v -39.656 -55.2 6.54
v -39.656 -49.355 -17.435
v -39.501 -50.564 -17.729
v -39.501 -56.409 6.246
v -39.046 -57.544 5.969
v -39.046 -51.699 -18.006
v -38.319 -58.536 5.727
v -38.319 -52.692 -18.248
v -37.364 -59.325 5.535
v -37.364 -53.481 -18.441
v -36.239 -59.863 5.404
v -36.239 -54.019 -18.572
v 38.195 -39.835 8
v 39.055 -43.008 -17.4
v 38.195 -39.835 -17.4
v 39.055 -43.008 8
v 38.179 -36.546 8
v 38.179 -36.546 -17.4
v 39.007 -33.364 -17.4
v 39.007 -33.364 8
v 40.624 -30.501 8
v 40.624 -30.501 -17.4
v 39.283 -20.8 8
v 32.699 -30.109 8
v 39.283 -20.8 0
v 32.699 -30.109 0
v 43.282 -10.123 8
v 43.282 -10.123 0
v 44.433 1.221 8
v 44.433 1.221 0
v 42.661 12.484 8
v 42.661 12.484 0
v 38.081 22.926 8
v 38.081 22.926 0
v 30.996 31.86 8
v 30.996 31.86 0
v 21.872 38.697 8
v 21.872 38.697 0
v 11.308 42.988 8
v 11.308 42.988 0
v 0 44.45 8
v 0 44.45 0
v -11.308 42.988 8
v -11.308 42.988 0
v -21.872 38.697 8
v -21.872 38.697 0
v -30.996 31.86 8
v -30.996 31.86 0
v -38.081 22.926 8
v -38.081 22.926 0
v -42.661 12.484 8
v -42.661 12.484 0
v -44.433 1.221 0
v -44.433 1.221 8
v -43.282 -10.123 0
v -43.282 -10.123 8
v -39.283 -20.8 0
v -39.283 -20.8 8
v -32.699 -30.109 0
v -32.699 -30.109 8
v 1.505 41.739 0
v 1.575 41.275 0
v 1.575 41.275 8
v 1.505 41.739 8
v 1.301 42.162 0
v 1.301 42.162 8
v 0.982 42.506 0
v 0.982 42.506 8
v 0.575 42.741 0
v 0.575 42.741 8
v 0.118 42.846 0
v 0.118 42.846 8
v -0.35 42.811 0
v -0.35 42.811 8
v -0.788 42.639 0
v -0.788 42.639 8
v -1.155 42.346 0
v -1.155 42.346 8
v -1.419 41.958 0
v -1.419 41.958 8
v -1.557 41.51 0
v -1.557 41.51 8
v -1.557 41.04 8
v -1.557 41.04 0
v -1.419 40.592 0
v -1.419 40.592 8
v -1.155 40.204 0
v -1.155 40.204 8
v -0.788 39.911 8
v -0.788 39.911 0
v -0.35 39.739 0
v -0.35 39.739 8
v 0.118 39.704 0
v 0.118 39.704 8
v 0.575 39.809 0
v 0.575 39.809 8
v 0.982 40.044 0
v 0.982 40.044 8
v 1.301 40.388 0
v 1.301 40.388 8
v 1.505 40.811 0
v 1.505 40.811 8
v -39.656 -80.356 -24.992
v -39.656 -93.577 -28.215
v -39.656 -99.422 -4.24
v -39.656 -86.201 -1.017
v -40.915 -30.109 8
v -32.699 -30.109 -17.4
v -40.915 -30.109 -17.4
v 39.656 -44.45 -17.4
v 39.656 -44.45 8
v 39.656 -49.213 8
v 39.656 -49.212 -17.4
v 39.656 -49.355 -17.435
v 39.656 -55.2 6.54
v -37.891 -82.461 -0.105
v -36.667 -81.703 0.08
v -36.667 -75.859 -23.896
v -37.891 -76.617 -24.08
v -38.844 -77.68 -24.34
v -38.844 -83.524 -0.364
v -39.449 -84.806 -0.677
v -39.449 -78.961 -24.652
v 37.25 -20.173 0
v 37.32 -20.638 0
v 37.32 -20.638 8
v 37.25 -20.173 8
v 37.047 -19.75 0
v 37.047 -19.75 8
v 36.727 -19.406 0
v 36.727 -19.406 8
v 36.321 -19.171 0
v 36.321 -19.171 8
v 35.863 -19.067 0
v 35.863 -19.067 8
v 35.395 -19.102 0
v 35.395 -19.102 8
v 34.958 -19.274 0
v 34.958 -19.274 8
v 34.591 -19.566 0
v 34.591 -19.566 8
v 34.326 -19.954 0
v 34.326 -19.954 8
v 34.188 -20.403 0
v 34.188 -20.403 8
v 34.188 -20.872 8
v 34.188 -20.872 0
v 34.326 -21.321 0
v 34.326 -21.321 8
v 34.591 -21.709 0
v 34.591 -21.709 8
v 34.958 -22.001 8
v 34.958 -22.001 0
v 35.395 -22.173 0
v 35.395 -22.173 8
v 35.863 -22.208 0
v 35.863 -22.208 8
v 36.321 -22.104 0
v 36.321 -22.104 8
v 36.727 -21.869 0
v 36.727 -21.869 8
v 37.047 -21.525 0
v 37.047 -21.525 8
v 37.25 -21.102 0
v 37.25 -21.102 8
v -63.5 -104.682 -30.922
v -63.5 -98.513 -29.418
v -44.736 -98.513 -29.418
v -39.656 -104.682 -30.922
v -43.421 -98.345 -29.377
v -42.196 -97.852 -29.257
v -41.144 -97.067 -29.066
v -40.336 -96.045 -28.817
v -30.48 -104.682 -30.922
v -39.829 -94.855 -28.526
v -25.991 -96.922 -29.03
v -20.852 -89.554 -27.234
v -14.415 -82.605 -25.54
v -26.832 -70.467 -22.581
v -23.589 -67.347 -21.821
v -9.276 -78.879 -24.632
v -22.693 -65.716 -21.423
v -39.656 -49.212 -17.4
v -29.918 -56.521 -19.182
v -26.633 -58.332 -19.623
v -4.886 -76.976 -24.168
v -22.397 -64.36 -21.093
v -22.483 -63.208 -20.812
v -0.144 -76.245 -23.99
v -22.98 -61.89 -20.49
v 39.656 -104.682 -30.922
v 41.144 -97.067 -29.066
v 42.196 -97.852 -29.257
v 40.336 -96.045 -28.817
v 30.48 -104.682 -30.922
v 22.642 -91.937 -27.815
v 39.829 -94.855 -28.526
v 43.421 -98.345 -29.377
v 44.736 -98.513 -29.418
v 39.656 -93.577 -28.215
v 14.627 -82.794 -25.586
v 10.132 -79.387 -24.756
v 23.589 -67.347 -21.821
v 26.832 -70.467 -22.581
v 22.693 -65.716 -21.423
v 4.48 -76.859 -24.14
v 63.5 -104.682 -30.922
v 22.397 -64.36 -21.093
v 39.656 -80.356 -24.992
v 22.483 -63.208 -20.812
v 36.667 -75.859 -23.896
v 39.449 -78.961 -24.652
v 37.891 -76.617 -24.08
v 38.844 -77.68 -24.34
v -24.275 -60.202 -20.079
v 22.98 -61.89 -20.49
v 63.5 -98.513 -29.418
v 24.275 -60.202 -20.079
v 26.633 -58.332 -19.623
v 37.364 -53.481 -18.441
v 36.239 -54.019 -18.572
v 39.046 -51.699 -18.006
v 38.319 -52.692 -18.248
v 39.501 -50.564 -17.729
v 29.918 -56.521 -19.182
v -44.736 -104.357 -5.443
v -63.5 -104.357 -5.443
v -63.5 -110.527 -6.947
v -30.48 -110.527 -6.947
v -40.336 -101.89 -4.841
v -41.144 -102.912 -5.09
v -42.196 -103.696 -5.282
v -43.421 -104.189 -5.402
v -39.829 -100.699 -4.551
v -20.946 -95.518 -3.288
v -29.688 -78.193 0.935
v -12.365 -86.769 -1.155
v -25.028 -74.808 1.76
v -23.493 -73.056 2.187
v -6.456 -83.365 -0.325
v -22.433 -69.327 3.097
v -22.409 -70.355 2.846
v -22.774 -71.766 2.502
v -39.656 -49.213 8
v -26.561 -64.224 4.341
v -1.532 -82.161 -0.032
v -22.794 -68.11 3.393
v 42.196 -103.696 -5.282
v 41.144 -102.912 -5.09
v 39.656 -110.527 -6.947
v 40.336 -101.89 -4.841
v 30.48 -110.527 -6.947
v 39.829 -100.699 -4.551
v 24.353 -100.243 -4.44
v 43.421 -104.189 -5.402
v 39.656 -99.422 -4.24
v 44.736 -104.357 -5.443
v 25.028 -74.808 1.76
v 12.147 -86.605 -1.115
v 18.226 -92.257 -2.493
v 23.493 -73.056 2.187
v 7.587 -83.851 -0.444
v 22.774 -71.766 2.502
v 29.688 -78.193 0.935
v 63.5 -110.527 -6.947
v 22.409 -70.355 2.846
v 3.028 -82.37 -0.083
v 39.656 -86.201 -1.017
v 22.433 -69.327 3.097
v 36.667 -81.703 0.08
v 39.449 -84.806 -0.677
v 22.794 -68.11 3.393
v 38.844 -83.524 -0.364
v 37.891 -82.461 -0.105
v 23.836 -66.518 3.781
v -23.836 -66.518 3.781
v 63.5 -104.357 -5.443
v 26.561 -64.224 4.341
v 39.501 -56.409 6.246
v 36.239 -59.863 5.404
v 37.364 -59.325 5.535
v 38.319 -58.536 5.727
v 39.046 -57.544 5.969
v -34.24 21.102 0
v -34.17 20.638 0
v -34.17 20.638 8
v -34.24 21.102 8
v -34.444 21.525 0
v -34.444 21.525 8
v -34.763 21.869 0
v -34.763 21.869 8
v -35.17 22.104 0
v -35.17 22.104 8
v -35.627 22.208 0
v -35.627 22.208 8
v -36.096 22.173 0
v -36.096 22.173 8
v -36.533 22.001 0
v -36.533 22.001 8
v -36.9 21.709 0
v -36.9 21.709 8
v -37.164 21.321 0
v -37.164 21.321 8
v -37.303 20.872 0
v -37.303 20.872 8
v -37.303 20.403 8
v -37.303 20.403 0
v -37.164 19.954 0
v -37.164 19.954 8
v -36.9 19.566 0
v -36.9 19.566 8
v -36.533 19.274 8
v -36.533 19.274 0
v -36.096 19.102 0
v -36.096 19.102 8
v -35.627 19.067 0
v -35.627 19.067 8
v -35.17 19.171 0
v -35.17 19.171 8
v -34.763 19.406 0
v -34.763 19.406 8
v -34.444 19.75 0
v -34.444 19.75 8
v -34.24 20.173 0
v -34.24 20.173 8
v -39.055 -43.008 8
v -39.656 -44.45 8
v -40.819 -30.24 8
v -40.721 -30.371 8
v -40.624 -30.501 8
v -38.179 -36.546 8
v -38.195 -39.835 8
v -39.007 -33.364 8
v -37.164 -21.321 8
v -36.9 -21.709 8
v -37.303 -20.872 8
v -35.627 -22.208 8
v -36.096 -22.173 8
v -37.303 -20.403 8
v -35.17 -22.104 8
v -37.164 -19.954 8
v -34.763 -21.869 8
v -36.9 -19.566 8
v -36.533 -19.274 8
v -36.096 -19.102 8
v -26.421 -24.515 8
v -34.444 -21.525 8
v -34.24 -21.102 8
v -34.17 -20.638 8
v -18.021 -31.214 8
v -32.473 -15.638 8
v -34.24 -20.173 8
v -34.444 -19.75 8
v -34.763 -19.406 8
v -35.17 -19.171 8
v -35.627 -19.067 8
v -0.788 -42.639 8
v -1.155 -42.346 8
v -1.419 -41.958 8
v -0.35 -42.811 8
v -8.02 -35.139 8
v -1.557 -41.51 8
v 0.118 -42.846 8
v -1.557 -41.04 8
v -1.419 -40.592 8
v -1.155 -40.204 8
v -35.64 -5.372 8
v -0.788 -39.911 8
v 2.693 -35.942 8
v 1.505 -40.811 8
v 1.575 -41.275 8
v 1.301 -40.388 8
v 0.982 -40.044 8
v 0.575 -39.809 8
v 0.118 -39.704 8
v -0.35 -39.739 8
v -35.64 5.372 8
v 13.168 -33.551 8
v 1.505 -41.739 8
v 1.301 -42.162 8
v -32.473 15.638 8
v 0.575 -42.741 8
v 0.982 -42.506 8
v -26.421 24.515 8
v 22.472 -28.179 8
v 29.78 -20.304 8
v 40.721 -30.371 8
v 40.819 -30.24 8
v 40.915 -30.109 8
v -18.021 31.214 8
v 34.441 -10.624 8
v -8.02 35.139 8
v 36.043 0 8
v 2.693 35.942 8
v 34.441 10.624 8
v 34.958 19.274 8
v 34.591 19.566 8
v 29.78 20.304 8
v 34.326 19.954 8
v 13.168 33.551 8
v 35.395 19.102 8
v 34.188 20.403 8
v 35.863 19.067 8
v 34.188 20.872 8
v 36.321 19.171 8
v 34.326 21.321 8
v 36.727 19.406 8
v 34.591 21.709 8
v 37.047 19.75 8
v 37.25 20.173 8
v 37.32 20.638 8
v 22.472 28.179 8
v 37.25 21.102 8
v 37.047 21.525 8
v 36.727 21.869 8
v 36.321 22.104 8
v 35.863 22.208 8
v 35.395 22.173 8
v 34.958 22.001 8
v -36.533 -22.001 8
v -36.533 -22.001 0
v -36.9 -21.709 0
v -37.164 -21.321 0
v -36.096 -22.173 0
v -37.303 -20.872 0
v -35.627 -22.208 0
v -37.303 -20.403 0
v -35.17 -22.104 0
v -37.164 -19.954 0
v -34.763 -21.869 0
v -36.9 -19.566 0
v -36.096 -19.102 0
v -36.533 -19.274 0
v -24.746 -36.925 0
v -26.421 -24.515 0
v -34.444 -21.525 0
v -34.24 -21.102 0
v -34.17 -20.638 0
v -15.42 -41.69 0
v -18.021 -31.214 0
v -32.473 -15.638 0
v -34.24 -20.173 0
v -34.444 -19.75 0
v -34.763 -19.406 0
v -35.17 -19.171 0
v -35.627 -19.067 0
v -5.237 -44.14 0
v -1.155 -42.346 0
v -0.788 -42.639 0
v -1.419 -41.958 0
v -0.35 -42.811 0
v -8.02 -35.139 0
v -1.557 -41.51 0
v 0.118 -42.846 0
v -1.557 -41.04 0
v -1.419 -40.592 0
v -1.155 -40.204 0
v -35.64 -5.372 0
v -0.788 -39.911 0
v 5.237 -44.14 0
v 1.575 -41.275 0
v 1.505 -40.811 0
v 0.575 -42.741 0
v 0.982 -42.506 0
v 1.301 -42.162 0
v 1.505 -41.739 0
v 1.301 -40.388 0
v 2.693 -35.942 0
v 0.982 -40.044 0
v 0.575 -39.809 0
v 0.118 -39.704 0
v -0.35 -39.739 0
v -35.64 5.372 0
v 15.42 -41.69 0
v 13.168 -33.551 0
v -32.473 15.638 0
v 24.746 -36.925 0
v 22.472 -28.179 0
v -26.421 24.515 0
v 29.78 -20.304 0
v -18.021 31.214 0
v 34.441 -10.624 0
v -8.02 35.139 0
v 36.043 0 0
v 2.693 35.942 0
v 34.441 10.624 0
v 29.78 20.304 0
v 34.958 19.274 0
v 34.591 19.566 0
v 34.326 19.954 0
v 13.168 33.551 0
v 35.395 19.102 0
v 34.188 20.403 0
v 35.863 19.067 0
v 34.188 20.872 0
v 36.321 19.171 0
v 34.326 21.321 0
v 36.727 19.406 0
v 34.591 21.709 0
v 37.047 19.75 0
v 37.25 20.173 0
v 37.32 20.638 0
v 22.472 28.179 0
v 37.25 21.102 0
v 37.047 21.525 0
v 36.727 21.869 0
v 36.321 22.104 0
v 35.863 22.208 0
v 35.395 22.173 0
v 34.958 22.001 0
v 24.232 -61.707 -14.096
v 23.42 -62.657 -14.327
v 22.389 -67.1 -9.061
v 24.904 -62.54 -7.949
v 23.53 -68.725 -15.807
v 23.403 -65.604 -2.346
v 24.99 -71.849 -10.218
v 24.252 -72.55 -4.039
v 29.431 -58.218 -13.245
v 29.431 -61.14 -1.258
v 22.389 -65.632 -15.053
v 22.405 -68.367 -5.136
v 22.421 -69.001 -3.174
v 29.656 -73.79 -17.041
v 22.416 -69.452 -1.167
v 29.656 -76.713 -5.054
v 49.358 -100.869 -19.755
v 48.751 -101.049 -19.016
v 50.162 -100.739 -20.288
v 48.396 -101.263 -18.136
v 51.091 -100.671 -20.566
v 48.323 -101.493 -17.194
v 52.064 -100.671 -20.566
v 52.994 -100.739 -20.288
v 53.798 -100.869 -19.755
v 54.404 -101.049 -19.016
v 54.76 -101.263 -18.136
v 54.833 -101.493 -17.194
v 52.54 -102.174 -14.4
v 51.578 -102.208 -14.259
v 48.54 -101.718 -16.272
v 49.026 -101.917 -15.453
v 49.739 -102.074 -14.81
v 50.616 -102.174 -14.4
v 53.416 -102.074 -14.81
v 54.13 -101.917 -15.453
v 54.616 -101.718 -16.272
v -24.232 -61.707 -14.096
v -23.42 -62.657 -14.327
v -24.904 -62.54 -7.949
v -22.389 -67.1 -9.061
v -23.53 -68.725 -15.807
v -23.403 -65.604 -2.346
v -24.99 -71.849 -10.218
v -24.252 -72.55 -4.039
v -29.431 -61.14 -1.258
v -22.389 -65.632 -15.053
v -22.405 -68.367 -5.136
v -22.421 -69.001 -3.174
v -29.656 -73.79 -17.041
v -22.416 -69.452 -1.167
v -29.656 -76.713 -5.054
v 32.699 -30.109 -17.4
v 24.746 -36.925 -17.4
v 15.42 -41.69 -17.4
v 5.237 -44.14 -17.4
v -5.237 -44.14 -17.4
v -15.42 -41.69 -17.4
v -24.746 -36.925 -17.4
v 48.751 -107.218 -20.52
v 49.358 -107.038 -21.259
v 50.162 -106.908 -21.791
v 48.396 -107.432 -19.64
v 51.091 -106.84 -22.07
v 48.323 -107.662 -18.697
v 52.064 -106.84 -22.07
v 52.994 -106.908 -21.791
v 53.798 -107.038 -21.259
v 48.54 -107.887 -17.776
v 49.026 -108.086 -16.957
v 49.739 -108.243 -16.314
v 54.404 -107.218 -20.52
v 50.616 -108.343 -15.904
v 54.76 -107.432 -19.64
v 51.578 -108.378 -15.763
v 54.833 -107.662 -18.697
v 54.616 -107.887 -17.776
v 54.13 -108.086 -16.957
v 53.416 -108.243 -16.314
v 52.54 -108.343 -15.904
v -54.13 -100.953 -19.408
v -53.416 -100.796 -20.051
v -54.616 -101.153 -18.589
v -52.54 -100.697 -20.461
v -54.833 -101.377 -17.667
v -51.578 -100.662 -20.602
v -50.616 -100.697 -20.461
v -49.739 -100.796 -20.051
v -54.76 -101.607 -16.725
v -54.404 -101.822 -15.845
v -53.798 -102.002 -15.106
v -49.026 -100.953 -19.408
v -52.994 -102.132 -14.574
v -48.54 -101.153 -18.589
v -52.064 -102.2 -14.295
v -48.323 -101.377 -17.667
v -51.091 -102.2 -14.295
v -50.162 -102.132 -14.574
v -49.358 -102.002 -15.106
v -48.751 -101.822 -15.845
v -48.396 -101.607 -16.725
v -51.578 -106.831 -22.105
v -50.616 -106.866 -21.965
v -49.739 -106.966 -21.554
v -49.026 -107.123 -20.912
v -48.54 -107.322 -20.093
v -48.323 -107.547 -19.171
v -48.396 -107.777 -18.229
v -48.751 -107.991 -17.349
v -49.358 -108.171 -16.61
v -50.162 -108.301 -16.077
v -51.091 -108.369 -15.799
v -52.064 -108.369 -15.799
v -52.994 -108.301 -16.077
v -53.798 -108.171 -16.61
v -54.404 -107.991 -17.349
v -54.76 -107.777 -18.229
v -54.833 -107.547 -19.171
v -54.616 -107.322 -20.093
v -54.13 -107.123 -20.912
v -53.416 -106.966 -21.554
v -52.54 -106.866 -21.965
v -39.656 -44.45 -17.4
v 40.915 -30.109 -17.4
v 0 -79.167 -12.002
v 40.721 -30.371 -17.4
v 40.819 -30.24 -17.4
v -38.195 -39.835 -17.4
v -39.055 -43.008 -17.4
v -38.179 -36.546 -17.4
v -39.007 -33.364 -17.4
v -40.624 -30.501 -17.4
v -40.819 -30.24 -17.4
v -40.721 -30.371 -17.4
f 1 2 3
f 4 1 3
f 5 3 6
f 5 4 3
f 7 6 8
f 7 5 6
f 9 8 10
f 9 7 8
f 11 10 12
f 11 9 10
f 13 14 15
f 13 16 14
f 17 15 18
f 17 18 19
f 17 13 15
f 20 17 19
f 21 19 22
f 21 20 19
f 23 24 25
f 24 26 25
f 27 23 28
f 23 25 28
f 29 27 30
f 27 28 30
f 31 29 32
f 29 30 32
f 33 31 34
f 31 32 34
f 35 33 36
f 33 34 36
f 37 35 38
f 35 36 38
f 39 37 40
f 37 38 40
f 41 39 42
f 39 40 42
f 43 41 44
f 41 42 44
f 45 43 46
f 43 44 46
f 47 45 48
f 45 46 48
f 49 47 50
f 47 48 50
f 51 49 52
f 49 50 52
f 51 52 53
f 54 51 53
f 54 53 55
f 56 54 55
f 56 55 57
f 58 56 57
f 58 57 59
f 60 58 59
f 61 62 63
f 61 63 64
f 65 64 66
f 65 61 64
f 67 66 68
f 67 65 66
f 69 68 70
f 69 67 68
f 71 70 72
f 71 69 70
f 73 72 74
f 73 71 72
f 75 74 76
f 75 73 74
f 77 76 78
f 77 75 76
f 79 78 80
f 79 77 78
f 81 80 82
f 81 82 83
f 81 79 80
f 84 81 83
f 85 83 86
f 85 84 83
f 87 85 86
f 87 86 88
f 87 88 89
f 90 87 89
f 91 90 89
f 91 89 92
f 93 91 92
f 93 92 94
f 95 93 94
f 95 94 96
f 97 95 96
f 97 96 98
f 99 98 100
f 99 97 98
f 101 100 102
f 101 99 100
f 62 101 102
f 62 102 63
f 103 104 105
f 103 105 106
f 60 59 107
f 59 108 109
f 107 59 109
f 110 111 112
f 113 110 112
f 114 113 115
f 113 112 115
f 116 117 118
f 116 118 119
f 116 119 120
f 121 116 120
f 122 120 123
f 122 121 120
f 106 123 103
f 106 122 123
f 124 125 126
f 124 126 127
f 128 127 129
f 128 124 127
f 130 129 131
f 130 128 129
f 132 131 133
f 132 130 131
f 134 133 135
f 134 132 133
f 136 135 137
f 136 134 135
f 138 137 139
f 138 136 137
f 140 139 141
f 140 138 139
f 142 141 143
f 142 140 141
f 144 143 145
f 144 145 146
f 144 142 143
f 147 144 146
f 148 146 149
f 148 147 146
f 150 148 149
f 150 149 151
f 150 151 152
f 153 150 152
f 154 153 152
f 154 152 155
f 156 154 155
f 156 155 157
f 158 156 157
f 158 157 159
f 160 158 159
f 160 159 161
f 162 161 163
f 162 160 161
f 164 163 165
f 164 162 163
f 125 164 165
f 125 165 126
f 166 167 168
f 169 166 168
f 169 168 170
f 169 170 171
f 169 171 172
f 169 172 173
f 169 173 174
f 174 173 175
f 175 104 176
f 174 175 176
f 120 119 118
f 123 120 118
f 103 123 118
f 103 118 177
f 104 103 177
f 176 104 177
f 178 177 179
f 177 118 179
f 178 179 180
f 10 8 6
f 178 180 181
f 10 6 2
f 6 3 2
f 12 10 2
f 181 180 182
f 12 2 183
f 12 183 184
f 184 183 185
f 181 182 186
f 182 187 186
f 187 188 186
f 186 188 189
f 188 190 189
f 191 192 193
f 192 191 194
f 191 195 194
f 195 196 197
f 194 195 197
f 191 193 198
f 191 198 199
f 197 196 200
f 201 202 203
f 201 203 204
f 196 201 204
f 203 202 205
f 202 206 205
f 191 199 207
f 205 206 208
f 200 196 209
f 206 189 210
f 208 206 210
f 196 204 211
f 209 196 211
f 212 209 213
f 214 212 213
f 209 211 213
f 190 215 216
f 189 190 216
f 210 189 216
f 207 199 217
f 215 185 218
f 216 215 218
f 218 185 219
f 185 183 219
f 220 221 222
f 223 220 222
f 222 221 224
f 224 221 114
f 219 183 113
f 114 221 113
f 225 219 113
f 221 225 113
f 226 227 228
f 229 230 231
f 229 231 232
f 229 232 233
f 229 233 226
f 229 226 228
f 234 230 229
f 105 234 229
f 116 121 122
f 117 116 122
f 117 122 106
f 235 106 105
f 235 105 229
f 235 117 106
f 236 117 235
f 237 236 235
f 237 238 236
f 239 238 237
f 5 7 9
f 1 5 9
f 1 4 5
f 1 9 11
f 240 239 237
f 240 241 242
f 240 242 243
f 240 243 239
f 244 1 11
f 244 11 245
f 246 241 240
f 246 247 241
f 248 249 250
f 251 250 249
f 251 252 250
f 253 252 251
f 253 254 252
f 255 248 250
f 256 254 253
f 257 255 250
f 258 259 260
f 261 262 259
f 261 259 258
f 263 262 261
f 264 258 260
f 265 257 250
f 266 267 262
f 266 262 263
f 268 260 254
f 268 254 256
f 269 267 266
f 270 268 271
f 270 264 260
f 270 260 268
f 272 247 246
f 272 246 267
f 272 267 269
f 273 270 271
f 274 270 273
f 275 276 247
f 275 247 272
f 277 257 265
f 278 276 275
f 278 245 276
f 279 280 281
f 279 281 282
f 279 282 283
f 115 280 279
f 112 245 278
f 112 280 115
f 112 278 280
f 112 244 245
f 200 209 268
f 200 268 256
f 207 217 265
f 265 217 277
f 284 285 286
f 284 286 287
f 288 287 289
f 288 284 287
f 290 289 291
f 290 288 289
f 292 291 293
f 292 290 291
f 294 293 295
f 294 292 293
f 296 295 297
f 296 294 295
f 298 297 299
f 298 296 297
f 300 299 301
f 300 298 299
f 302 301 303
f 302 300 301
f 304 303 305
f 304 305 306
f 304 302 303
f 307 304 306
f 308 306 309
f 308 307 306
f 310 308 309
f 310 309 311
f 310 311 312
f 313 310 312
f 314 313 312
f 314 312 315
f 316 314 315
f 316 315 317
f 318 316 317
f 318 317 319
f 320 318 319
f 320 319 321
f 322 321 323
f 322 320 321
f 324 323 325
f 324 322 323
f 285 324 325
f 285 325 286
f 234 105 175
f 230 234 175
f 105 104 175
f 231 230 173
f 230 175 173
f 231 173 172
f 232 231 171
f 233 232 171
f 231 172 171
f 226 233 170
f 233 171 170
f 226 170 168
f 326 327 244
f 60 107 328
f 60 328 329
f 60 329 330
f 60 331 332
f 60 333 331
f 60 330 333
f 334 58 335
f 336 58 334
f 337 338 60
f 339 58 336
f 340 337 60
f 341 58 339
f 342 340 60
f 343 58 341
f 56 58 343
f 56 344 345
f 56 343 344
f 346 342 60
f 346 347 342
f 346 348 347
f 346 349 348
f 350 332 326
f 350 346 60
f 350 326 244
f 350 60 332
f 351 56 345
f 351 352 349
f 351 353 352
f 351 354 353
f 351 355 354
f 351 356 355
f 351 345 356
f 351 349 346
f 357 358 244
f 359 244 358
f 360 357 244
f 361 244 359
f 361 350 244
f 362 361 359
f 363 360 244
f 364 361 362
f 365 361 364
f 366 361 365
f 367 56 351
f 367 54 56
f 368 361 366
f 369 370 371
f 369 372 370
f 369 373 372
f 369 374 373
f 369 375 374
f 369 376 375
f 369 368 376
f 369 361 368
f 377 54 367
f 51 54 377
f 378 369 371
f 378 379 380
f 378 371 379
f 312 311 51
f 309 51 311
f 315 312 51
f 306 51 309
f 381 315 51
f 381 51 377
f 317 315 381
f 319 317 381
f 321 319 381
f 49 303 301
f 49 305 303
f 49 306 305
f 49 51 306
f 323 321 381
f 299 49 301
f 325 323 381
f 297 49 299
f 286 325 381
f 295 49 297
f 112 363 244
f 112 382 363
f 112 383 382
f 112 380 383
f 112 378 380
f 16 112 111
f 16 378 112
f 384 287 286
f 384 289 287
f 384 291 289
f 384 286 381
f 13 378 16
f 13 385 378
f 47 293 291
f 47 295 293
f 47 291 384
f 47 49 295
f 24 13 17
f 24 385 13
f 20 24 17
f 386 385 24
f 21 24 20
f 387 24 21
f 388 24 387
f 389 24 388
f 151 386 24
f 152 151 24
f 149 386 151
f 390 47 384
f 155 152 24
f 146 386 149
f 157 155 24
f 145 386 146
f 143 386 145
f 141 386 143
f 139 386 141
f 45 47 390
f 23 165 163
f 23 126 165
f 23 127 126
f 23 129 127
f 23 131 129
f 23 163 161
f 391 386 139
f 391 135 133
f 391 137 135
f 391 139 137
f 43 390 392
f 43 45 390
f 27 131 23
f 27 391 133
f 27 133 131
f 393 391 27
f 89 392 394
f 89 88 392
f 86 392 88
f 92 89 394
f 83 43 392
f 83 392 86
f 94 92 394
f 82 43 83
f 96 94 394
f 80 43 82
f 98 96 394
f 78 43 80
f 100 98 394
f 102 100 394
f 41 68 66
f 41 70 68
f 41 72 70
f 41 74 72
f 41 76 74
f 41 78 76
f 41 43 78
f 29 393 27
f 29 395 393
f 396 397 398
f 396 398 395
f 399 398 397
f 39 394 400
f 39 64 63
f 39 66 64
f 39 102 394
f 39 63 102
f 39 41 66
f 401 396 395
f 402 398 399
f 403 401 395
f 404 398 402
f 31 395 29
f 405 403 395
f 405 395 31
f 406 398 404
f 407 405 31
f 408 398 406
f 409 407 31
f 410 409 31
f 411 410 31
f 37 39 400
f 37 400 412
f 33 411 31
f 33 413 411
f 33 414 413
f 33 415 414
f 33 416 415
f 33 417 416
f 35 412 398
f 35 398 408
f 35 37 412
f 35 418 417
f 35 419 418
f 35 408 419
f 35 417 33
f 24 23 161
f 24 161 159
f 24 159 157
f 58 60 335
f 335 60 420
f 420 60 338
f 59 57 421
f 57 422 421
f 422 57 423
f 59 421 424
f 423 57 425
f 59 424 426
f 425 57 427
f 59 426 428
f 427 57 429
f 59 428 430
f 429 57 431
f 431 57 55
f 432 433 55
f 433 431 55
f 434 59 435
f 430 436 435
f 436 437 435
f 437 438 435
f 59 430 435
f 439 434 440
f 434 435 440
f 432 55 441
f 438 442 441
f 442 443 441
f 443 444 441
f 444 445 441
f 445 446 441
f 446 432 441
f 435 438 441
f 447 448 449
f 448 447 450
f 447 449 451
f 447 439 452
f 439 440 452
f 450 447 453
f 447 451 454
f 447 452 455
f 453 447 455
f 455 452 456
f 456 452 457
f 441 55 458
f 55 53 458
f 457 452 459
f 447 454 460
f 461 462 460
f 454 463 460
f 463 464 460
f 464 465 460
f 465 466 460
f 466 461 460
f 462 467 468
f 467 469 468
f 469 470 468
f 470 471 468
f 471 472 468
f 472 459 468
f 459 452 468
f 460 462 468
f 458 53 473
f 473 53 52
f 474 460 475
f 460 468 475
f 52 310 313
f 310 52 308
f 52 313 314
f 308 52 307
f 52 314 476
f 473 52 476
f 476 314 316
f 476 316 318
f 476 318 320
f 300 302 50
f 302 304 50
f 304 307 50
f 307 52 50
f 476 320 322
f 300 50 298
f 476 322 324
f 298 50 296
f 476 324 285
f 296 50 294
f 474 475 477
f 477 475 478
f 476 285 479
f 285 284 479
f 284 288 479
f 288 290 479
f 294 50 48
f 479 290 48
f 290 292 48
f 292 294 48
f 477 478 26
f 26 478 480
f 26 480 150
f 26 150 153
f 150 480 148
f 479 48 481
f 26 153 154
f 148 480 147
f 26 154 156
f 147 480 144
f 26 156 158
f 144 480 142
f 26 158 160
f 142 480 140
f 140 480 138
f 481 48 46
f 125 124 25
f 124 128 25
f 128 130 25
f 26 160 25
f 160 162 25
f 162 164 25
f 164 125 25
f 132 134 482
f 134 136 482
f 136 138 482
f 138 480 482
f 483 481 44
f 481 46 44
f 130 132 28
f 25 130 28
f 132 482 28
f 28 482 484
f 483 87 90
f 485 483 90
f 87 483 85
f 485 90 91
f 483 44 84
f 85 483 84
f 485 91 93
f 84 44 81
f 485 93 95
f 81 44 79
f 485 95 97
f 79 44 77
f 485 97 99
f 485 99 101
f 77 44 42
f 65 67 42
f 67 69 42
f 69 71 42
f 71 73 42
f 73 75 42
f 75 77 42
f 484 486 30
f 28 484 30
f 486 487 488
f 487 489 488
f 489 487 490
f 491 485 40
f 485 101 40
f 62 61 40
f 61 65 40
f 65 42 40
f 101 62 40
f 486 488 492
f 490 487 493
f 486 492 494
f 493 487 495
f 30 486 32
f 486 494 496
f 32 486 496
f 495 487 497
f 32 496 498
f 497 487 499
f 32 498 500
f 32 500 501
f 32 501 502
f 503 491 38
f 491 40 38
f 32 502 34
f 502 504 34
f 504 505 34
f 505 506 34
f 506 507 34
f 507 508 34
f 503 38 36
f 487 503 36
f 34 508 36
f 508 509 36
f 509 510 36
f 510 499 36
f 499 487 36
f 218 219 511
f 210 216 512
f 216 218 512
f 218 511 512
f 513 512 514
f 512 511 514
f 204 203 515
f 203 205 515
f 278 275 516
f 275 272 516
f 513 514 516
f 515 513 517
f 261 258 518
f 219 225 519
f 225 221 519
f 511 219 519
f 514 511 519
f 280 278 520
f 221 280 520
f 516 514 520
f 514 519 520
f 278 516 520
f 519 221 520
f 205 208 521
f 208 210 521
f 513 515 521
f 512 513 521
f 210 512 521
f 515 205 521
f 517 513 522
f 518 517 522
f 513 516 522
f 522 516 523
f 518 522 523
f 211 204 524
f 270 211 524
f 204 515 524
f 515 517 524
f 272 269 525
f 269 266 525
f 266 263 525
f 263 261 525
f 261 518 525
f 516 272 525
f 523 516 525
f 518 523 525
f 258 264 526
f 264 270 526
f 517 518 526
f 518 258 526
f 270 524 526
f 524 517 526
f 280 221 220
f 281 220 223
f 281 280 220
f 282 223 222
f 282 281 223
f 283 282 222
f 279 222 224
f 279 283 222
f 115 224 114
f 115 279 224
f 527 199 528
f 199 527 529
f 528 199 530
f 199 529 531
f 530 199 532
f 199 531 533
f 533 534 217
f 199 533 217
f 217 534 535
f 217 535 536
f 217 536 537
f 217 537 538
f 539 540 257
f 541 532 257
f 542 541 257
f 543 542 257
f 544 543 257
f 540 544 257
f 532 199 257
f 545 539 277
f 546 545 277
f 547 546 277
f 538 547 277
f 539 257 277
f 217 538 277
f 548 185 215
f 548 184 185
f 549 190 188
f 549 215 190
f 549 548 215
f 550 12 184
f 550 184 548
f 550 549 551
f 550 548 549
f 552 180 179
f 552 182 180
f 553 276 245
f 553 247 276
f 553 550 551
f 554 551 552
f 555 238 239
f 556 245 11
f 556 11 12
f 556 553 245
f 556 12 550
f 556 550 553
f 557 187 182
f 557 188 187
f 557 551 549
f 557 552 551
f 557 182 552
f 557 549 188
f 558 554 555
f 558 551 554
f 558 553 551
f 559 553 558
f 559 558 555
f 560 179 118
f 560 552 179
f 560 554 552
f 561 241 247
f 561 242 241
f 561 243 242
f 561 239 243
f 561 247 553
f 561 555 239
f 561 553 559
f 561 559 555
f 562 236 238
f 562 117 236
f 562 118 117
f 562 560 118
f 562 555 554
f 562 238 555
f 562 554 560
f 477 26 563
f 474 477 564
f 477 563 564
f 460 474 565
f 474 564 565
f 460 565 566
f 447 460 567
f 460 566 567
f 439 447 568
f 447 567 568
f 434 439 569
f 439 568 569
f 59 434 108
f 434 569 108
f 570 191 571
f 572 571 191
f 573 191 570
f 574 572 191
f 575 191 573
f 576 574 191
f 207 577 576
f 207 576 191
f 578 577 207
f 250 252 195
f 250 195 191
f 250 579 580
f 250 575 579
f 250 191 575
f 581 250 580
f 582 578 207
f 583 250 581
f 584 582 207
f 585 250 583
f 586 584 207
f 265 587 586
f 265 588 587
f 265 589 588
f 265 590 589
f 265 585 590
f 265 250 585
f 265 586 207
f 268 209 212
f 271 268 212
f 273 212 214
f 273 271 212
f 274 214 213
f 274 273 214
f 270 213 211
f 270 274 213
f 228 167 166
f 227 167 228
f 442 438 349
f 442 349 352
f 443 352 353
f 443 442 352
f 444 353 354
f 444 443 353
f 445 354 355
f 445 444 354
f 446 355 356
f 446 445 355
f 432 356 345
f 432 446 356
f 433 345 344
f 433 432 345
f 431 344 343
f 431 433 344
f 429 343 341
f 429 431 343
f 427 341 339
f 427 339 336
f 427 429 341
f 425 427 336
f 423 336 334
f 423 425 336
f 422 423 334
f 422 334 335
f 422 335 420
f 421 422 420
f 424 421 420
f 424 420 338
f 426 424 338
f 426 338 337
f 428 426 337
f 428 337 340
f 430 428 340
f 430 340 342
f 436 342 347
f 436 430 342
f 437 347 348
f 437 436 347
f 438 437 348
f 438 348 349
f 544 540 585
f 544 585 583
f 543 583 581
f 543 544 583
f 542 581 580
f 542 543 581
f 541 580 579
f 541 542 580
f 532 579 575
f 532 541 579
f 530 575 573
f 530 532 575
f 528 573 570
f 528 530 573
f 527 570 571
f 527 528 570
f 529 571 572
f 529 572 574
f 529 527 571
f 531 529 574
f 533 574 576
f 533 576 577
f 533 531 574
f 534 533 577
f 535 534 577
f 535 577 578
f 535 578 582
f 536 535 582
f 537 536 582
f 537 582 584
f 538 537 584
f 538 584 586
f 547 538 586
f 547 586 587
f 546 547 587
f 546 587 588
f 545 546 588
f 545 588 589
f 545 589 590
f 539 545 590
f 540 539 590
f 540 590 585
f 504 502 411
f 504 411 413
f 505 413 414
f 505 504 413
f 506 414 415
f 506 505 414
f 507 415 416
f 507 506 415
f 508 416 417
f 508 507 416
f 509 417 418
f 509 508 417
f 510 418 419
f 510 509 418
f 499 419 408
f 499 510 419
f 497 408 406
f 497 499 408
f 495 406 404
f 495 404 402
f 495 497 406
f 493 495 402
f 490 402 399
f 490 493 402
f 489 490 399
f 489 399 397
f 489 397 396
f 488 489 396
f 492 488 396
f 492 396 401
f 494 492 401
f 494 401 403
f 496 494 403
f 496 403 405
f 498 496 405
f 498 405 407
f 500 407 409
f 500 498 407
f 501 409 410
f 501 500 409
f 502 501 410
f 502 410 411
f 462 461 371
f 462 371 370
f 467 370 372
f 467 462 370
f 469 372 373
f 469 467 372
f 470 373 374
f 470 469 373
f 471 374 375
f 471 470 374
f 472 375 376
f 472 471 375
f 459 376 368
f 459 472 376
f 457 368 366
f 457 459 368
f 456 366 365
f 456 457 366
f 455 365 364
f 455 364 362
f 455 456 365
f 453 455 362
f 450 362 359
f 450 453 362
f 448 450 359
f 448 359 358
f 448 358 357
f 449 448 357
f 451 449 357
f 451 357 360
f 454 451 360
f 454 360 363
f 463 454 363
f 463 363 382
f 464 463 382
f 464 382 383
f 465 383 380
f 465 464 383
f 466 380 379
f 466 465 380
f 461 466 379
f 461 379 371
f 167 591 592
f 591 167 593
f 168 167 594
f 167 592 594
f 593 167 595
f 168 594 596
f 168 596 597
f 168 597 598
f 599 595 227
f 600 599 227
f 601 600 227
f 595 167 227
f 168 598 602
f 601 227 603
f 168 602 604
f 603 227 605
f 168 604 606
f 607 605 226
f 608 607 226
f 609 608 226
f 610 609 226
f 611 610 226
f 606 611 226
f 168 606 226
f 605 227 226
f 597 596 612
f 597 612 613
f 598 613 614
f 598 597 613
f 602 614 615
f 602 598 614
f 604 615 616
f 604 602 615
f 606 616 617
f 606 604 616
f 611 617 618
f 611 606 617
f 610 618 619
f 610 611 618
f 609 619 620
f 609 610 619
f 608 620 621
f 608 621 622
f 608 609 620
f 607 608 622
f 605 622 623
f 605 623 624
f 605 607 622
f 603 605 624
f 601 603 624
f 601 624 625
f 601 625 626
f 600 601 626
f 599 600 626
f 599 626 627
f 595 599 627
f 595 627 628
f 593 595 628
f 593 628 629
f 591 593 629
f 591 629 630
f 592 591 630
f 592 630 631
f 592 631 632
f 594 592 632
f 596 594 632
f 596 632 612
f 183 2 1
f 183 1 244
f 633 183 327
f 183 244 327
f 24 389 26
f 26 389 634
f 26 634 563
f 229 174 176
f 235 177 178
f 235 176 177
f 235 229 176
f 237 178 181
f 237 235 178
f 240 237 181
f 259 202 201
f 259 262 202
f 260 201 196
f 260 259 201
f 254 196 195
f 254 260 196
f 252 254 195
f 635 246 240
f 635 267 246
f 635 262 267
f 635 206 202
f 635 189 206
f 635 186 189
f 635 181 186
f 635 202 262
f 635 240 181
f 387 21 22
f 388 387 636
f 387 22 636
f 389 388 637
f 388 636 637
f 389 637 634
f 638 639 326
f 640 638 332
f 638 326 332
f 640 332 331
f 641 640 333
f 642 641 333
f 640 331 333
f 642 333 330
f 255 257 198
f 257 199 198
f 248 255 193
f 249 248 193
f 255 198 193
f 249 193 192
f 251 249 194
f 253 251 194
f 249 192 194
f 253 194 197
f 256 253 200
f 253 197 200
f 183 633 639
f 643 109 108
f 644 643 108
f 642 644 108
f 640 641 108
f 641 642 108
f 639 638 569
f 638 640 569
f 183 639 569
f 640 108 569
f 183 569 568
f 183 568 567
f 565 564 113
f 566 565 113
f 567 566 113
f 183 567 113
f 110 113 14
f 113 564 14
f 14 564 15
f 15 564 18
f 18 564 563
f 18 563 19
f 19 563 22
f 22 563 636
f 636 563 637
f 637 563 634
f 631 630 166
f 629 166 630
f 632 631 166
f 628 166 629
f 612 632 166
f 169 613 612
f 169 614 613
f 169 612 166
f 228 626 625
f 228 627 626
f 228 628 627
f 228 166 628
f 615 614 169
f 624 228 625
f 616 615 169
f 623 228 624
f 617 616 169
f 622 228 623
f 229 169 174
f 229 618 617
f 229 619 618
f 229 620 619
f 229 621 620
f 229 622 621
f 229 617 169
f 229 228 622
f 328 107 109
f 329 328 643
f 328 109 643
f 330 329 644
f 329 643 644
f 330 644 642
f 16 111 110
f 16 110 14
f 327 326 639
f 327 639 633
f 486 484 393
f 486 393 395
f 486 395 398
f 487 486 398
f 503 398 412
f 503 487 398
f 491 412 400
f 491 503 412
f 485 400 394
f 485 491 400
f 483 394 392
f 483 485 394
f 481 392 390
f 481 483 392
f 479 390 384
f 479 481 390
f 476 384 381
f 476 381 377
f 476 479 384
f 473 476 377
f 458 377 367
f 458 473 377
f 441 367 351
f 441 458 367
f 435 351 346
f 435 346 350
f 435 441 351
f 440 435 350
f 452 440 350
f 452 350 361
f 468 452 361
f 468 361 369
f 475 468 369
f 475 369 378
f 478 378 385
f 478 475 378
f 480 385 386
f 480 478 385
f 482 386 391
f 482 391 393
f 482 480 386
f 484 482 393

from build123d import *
from build123d.topology import SkipClean

# Parameters (mm, degrees)
SKETCH1_R                       = 44.45
SKETCH1_R_2                     = 36.0426
SKETCH1_R_3                     = 1.575
BOSS_EXTRUDE1_DEPTH             = 8
BOSS_EXTRUDE2_START             = -25.4
BOSS_EXTRUDE2_DEPTH             = 25.4
SKETCH5_W                       = 127
SKETCH5_H                       = 24.677347648
BOSS_EXTRUDE3_DEPTH             = 22.86
BOSS_EXTRUDE3_DIRECTION_2_REACH = 117.98
CUT_EXTRUDE1_DEPTH              = 103.517532245
CUT_EXTRUDE2_DEPTH              = 106.121352295
SKETCH8_R                       = 3.2639
CUT_EXTRUDE3_DEPTH              = 132.797554186
SKETCH10_W                      = 23.84426271
SKETCH10_H                      = 24.677347648
SKETCH10_R                      = 3.2639
BOSS_EXTRUDE4_DEPTH             = 34.23412
FILLET3_START                   = -19.427790223
FILLET3_DEPTH                   = 24.677347648
FILLET4_R                       = 12.7
SKETCH11_W                      = 23.84426271
SKETCH11_H                      = 32.29864
CUT_EXTRUDE4_DEPTH              = 134.162391299
BOSS_EXTRUDE5_DEPTH             = 24.677347648
FILLET5_R                       = 5.08
CUT_EXTRUDE5_DEPTH              = 134.162391299
CUT_EXTRUDE6_DEPTH              = 134.162391464
FILLET6_START                   = -20
FILLET6_DEPTH                   = 26.377499095


with BuildPart() as part:
    # Sketch1 → Boss-Extrude1 (new body)
    with BuildSketch(Plane.XY):
        Circle(SKETCH1_R)
        Circle(SKETCH1_R_2, mode=Mode.SUBTRACT)
        with Locations((35.745198541, 20.6375)):
            Circle(SKETCH1_R_3, mode=Mode.SUBTRACT)
        with Locations((0, 41.275)):
            Circle(SKETCH1_R_3, mode=Mode.SUBTRACT)
        with Locations((-35.745198541, 20.6375)):
            Circle(SKETCH1_R_3, mode=Mode.SUBTRACT)
        with Locations((-35.745198541, -20.6375)):
            Circle(SKETCH1_R_3, mode=Mode.SUBTRACT)
        with Locations((0, -41.275)):
            Circle(SKETCH1_R_3, mode=Mode.SUBTRACT)
        with Locations((35.745198541, -20.6375)):
            Circle(SKETCH1_R_3, mode=Mode.SUBTRACT)
    extrude(amount=BOSS_EXTRUDE1_DEPTH)

    # Sketch4 → Boss-Extrude2 (add)
    with BuildSketch(Plane.XY.offset(8).offset(BOSS_EXTRUDE2_START)):
        with BuildLine():
            Line((-39.65573729, -44.45), (-63.5, -44.45))
            Line((-63.5, -44.45), (-63.5, -49.2125))
            Line((-63.5, -49.2125), (63.5, -49.2125))
            Line((63.5, -49.2125), (63.5, -44.45))
            Line((63.5, -44.45), (39.65573729, -44.45))
            Line((39.65573729, -44.45), (36.050670263, -35.790909091))
            ThreePointArc((36.050670263, -35.790909091), (38.587710733, -33.039802972), (40.915335308, -30.10938951))
            Line((40.915335308, -30.10938951), (32.699039181, -30.10938951))
            ThreePointArc((32.699039181, -30.10938951), (0, -44.45), (-32.699039181, -30.10938951))
            Line((-32.699039181, -30.10938951), (-40.915335308, -30.10938951))
            ThreePointArc((-40.915335308, -30.10938951), (-38.587710733, -33.039802972), (-36.050670263, -35.790909091))
            Line((-36.050670263, -35.790909091), (-39.65573729, -44.45))
        make_face()
    extrude(amount=BOSS_EXTRUDE2_DEPTH)

    # Sketch5 → Boss-Extrude3 (add)
    with BuildSketch(Plane(origin=(0, -50.455795448, -12.299797104), x_dir=(-1, 0, 0), z_dir=(0, -0.971549119997646, -0.2368381460656192))):
        with Locations((0, -7.089116399)):
            Rectangle(SKETCH5_W, SKETCH5_H)
    extrude(amount=BOSS_EXTRUDE3_DEPTH)

    # Boss-Extrude3 direction 2: up to this face of the body (flat: up to its plane)
    boss_extrude3_direction_2_end = Plane(part.part.faces().sort_by_distance((0, -49.2125, -4.7))[0])
    # Sketch5 → Boss-Extrude3 direction 2 (add, up to the picked face)
    with BuildSketch(Plane(origin=(0, -50.455795448, -12.299797104), x_dir=(-1, 0, 0), z_dir=(0, -0.971549119997646, -0.2368381460656192)), mode=Mode.PRIVATE) as boss_extrude3_direction_2_sk1:
        with Locations((0, -7.089116399)):
            Rectangle(SKETCH5_W, SKETCH5_H)
    boss_extrude3_direction_2_tool1 = split(extrude(boss_extrude3_direction_2_sk1.sketch, amount=-BOSS_EXTRUDE3_DIRECTION_2_REACH, mode=Mode.PRIVATE), bisect_by=boss_extrude3_direction_2_end, keep=Keep.BOTH, mode=Mode.PRIVATE)
    add(boss_extrude3_direction_2_tool1.solids().sort_by(Axis((0, -52.134769, -5.412372), (0, 0.971549119997646, 0.2368381460656192)))[0])

    # Sketch6 → Cut-Extrude1 (cut, through all)
    with BuildSketch(Plane(origin=(0, 1.243295448, -5.100202896), x_dir=(-1, 0, 0), z_dir=(0, 0.23683814606561915, -0.971549119997646))):
        with BuildLine():
            Line((-39.65573729, -74.793344809), (-39.65573729, -84.912644386))
            Line((-39.65573729, -84.912644386), (39.65573729, -84.912644386))
            Line((39.65573729, -84.912644386), (39.65573729, -74.793344809))
            add(Edge.make_bspline(
                [(-39.65573729, -74.793344809), (0, -52.373165884), (39.65573729, -74.793344809)],
                knots=[0, 0, 0, 1, 1, 1], degree=2))
        make_face()
    extrude(amount=-CUT_EXTRUDE1_DEPTH, mode=Mode.SUBTRACT)

    # Sketch7 → Cut-Extrude2 (cut, through all)
    with BuildSketch(Plane(origin=(0, -4.601241819, 18.875052495), x_dir=(1, 0, 0), z_dir=(0, -0.23683814606561915, 0.971549119997646))):
        Polygon((-39.65573729, -41.290653215), (-39.65573729, -70.378824809), (-63.5, -70.378824809), (-63.5, -38.21123826), (-39.65573729, -38.21123826), align=None)
        Polygon((39.65573729, -70.378824809), (63.5, -70.378824809), (63.5, -38.21123826), (39.65573729, -38.21123826), (39.65573729, -41.290653215), align=None)
    extrude(amount=-CUT_EXTRUDE2_DEPTH, mode=Mode.SUBTRACT)

    # Sketch8 → Cut-Extrude3 (cut, through all)
    with BuildSketch(Plane(origin=(0, -68.37648531, -16.66839039), x_dir=(1, 0, 0), z_dir=(0, 0.971549119997646, 0.2368381460656191))):
        with Locations(Location((51.577868645, -7.089116399, 0), (0, 0, 270))):
            Circle(SKETCH8_R)
        with Locations(Location((-51.577868645, -7.089116399, 0), (0, 0, 270))):
            Circle(SKETCH8_R)
    extrude(amount=-CUT_EXTRUDE3_DEPTH, mode=Mode.SUBTRACT)

    # Sketch10 → Boss-Extrude4 (add)
    # profile 1 of 2: a face of its own
    with SkipClean():  # the faces are left unmerged after this step: merging them gives an invalid solid
        with BuildSketch(Plane(origin=(0, -72.665408331, -17.713917123), x_dir=(1, 0, 0), z_dir=(0, -0.9715491199976461, -0.23683814606561926))):
            with Locations((-51.577868645, 7.089116399)):
                Rectangle(SKETCH10_W, SKETCH10_H)
            with Locations(Location((-51.577868645, 7.089116399, 0), (0, 0, 270))):
                Circle(SKETCH10_R, mode=Mode.SUBTRACT)
        # profile 2 of 2: a face of its own
        with BuildSketch(Plane(origin=(0, -72.665408331, -17.713917123), x_dir=(1, 0, 0), z_dir=(0, -0.9715491199976461, -0.23683814606561926))):
            with Locations((51.577868645, 7.089116399)):
                Rectangle(SKETCH10_W, SKETCH10_H)
            with Locations(Location((51.577868645, 7.089116399, 0), (0, 0, 90))):
                Circle(SKETCH10_R, mode=Mode.SUBTRACT)
        extrude(amount=BOSS_EXTRUDE4_DEPTH)
    add(part.part.scale(1), mode=Mode.REPLACE)  # the faces are merged on a copy

    # Fillet3: read off the stored shape, not the designer's step
    # Fillet3 outline → Fillet3 (add)
    with SkipClean():  # the faces are left unmerged after this step: merging them gives an invalid solid
        with BuildSketch(Plane(origin=(0, 0, 0), x_dir=(1, 0, 0), z_dir=(0, 0.23683814606561904, -0.9715491199976461)).offset(FILLET3_START)):
            with BuildLine():
                ThreePointArc((0, 75.867019335), (-23.207224812, 88.40595558), (-39.65573729, 109.027464809))
                Line((-39.65573729, 109.027464809), (-39.65573729, 74.793344809))
                add(Edge.make_bspline(
                    [(39.65573729, 74.793344809), (0, 52.373165884), (-39.65573729, 74.793344809)],
                    knots=[0, 0, 0, 1, 1, 1], degree=2))
                Line((39.65573729, 74.793344809), (39.65573729, 109.027464809))
                ThreePointArc((39.65573729, 109.027464809), (23.207224812, 88.40595558), (0, 75.867019335))
            make_face()
        extrude(amount=FILLET3_DEPTH)

    # Fillet4
    fillet4_edges = [part.edges().sort_by_distance(p)[0] for p in [
        (36.050670263, -35.790909091, -4.7),
        (-36.050670263, -35.790909091, -4.7),
    ]]
    fillet(fillet4_edges, radius=FILLET4_R)

    # Sketch11 → Cut-Extrude4 (cut, through all)
    with BuildSketch(Plane(origin=(0, -4.601241819, 18.875052495), x_dir=(1, 0, 0), z_dir=(0, -0.2368381460656192, 0.9715491199976461))):
        with Locations((-51.577868645, -86.528144809)):
            Rectangle(SKETCH11_W, SKETCH11_H)
        with Locations((51.577868645, -86.528144809)):
            Rectangle(SKETCH11_W, SKETCH11_H)
    extrude(amount=-CUT_EXTRUDE4_DEPTH, mode=Mode.SUBTRACT)

    # Sketch12 → Boss-Extrude5 (add)
    with BuildSketch(Plane(origin=(0, -4.601241819, 18.875052495), x_dir=(1, 0, 0), z_dir=(0, -0.2368381460656192, 0.9715491199976461))):
        Polygon((-39.65573729, -109.027464809), (39.65573729, -109.027464809), (30.485915065, -74.825591671), (-33.624171028, -74.825591671), align=None)
    extrude(amount=-BOSS_EXTRUDE5_DEPTH)

    # Fillet5
    fillet5_edges = [part.edges().sort_by_distance(p)[0] for p in [
        (-39.65573729, -101.435173764, -17.430515609),
        (39.65573729, -101.435173764, -17.430515609),
    ]]
    fillet(fillet5_edges, radius=FILLET5_R)

    # Sketch13 → Cut-Extrude5 (cut, through all)
    with BuildSketch(Plane(origin=(0, -4.601241819, 18.875052495), x_dir=(1, 0, 0), z_dir=(0, -0.2368381460656192, 0.9715491199976461))):
        with BuildLine():
            Line((-30.48, -109.027464809), (-30.48, -117.81515038))
            Line((-30.48, -117.81515038), (30.48, -117.81515038))
            Line((30.48, -117.81515038), (30.48, -109.027464809))
            add(Edge.make_bspline(
                [(-30.48, -109.027464809), (0, -50.4868087), (30.48, -109.027464809)],
                knots=[0, 0, 0, 1, 1, 1], degree=2))
        make_face()
    extrude(amount=-CUT_EXTRUDE5_DEPTH, mode=Mode.SUBTRACT)

    # Sketch14 → Cut-Extrude6 (cut, through all)
    with BuildSketch(Plane(origin=(0, -4.601241819, 18.875052495), x_dir=(1, 0, 0), z_dir=(0, -0.2368381460656192, 0.9715491199976461))):
        with BuildLine():
            Line((-39.65573729, -55.771894755), (-39.65573729, -80.653781316))
            add(Edge.make_bspline(
                [(-39.65573729, -55.771894755), (-5.12128529, -66.290498293), (-39.65573729, -80.653781316)],
                knots=[0, 0, 0, 1, 1, 1], degree=2))
        make_face()
        with BuildLine():
            Line((39.65573729, -80.653781316), (39.65573729, -55.771894755))
            add(Edge.make_bspline(
                [(39.65573729, -55.771894755), (5.12128529, -66.290498293), (39.65573729, -80.653781316)],
                knots=[0, 0, 0, 1, 1, 1], degree=2))
        make_face()
    extrude(amount=-CUT_EXTRUDE6_DEPTH, mode=Mode.SUBTRACT)

    # Fillet6: read off the stored shape, not the designer's step
    # Fillet6 outline → Fillet6 (cut)
    with BuildSketch(Plane(origin=(0, 0, 0), x_dir=(1, 0, 0), z_dir=(0, 0.23683814606561904, -0.9715491199976461)).offset(FILLET6_START)):
        with BuildLine():
            Line((-39.65573729, 55.771894755), (-39.65573729, 52.0803589))
            ThreePointArc((-39.65573729, 52.0803589), (-38.714392857, 55.026191566), (-36.239229378, 56.880274949))
            add(Edge.make_bspline(
                [(-36.239229378, 56.880274949), (-37.853422524, 56.320849013), (-39.65573729, 55.771894755)],
                knots=[0.947811109, 0.947811109, 0.947811109, 1, 1, 1], degree=2))
        make_face()
        with BuildLine():
            add(Edge.make_bspline(
                [(-39.65573729, 80.653781316), (-38.090633643, 80.00283638), (-36.667391198, 79.359788064)],
                knots=[0, 0, 0, 0.045320066, 0.045320066, 0.045320066], degree=2))
            ThreePointArc((-36.667391198, 79.359788064), (-38.843758017, 81.234124448), (-39.65573729, 83.989192337))
            Line((-39.65573729, 83.989192337), (-39.65573729, 80.653781316))
        make_face()
        with BuildLine():
            add(Edge.make_bspline(
                [(39.65573729, 55.771894755), (37.853422524, 56.320849013), (36.239229378, 56.880274949)],
                knots=[0, 0, 0, 0.052188891, 0.052188891, 0.052188891], degree=2))
            ThreePointArc((36.239229378, 56.880274949), (38.714392857, 55.026191566), (39.65573729, 52.0803589))
            Line((39.65573729, 52.0803589), (39.65573729, 55.771894755))
        make_face()
        with BuildLine():
            ThreePointArc((39.65573729, 83.989192337), (38.843758017, 81.234124448), (36.667391198, 79.359788064))
            add(Edge.make_bspline(
                [(36.667391198, 79.359788064), (38.090633643, 80.00283638), (39.65573729, 80.653781316)],
                knots=[0.954679934, 0.954679934, 0.954679934, 1, 1, 1], degree=2))
            Line((39.65573729, 80.653781316), (39.65573729, 83.989192337))
        make_face()
    extrude(amount=FILLET6_DEPTH, mode=Mode.SUBTRACT)


solid = part.part
